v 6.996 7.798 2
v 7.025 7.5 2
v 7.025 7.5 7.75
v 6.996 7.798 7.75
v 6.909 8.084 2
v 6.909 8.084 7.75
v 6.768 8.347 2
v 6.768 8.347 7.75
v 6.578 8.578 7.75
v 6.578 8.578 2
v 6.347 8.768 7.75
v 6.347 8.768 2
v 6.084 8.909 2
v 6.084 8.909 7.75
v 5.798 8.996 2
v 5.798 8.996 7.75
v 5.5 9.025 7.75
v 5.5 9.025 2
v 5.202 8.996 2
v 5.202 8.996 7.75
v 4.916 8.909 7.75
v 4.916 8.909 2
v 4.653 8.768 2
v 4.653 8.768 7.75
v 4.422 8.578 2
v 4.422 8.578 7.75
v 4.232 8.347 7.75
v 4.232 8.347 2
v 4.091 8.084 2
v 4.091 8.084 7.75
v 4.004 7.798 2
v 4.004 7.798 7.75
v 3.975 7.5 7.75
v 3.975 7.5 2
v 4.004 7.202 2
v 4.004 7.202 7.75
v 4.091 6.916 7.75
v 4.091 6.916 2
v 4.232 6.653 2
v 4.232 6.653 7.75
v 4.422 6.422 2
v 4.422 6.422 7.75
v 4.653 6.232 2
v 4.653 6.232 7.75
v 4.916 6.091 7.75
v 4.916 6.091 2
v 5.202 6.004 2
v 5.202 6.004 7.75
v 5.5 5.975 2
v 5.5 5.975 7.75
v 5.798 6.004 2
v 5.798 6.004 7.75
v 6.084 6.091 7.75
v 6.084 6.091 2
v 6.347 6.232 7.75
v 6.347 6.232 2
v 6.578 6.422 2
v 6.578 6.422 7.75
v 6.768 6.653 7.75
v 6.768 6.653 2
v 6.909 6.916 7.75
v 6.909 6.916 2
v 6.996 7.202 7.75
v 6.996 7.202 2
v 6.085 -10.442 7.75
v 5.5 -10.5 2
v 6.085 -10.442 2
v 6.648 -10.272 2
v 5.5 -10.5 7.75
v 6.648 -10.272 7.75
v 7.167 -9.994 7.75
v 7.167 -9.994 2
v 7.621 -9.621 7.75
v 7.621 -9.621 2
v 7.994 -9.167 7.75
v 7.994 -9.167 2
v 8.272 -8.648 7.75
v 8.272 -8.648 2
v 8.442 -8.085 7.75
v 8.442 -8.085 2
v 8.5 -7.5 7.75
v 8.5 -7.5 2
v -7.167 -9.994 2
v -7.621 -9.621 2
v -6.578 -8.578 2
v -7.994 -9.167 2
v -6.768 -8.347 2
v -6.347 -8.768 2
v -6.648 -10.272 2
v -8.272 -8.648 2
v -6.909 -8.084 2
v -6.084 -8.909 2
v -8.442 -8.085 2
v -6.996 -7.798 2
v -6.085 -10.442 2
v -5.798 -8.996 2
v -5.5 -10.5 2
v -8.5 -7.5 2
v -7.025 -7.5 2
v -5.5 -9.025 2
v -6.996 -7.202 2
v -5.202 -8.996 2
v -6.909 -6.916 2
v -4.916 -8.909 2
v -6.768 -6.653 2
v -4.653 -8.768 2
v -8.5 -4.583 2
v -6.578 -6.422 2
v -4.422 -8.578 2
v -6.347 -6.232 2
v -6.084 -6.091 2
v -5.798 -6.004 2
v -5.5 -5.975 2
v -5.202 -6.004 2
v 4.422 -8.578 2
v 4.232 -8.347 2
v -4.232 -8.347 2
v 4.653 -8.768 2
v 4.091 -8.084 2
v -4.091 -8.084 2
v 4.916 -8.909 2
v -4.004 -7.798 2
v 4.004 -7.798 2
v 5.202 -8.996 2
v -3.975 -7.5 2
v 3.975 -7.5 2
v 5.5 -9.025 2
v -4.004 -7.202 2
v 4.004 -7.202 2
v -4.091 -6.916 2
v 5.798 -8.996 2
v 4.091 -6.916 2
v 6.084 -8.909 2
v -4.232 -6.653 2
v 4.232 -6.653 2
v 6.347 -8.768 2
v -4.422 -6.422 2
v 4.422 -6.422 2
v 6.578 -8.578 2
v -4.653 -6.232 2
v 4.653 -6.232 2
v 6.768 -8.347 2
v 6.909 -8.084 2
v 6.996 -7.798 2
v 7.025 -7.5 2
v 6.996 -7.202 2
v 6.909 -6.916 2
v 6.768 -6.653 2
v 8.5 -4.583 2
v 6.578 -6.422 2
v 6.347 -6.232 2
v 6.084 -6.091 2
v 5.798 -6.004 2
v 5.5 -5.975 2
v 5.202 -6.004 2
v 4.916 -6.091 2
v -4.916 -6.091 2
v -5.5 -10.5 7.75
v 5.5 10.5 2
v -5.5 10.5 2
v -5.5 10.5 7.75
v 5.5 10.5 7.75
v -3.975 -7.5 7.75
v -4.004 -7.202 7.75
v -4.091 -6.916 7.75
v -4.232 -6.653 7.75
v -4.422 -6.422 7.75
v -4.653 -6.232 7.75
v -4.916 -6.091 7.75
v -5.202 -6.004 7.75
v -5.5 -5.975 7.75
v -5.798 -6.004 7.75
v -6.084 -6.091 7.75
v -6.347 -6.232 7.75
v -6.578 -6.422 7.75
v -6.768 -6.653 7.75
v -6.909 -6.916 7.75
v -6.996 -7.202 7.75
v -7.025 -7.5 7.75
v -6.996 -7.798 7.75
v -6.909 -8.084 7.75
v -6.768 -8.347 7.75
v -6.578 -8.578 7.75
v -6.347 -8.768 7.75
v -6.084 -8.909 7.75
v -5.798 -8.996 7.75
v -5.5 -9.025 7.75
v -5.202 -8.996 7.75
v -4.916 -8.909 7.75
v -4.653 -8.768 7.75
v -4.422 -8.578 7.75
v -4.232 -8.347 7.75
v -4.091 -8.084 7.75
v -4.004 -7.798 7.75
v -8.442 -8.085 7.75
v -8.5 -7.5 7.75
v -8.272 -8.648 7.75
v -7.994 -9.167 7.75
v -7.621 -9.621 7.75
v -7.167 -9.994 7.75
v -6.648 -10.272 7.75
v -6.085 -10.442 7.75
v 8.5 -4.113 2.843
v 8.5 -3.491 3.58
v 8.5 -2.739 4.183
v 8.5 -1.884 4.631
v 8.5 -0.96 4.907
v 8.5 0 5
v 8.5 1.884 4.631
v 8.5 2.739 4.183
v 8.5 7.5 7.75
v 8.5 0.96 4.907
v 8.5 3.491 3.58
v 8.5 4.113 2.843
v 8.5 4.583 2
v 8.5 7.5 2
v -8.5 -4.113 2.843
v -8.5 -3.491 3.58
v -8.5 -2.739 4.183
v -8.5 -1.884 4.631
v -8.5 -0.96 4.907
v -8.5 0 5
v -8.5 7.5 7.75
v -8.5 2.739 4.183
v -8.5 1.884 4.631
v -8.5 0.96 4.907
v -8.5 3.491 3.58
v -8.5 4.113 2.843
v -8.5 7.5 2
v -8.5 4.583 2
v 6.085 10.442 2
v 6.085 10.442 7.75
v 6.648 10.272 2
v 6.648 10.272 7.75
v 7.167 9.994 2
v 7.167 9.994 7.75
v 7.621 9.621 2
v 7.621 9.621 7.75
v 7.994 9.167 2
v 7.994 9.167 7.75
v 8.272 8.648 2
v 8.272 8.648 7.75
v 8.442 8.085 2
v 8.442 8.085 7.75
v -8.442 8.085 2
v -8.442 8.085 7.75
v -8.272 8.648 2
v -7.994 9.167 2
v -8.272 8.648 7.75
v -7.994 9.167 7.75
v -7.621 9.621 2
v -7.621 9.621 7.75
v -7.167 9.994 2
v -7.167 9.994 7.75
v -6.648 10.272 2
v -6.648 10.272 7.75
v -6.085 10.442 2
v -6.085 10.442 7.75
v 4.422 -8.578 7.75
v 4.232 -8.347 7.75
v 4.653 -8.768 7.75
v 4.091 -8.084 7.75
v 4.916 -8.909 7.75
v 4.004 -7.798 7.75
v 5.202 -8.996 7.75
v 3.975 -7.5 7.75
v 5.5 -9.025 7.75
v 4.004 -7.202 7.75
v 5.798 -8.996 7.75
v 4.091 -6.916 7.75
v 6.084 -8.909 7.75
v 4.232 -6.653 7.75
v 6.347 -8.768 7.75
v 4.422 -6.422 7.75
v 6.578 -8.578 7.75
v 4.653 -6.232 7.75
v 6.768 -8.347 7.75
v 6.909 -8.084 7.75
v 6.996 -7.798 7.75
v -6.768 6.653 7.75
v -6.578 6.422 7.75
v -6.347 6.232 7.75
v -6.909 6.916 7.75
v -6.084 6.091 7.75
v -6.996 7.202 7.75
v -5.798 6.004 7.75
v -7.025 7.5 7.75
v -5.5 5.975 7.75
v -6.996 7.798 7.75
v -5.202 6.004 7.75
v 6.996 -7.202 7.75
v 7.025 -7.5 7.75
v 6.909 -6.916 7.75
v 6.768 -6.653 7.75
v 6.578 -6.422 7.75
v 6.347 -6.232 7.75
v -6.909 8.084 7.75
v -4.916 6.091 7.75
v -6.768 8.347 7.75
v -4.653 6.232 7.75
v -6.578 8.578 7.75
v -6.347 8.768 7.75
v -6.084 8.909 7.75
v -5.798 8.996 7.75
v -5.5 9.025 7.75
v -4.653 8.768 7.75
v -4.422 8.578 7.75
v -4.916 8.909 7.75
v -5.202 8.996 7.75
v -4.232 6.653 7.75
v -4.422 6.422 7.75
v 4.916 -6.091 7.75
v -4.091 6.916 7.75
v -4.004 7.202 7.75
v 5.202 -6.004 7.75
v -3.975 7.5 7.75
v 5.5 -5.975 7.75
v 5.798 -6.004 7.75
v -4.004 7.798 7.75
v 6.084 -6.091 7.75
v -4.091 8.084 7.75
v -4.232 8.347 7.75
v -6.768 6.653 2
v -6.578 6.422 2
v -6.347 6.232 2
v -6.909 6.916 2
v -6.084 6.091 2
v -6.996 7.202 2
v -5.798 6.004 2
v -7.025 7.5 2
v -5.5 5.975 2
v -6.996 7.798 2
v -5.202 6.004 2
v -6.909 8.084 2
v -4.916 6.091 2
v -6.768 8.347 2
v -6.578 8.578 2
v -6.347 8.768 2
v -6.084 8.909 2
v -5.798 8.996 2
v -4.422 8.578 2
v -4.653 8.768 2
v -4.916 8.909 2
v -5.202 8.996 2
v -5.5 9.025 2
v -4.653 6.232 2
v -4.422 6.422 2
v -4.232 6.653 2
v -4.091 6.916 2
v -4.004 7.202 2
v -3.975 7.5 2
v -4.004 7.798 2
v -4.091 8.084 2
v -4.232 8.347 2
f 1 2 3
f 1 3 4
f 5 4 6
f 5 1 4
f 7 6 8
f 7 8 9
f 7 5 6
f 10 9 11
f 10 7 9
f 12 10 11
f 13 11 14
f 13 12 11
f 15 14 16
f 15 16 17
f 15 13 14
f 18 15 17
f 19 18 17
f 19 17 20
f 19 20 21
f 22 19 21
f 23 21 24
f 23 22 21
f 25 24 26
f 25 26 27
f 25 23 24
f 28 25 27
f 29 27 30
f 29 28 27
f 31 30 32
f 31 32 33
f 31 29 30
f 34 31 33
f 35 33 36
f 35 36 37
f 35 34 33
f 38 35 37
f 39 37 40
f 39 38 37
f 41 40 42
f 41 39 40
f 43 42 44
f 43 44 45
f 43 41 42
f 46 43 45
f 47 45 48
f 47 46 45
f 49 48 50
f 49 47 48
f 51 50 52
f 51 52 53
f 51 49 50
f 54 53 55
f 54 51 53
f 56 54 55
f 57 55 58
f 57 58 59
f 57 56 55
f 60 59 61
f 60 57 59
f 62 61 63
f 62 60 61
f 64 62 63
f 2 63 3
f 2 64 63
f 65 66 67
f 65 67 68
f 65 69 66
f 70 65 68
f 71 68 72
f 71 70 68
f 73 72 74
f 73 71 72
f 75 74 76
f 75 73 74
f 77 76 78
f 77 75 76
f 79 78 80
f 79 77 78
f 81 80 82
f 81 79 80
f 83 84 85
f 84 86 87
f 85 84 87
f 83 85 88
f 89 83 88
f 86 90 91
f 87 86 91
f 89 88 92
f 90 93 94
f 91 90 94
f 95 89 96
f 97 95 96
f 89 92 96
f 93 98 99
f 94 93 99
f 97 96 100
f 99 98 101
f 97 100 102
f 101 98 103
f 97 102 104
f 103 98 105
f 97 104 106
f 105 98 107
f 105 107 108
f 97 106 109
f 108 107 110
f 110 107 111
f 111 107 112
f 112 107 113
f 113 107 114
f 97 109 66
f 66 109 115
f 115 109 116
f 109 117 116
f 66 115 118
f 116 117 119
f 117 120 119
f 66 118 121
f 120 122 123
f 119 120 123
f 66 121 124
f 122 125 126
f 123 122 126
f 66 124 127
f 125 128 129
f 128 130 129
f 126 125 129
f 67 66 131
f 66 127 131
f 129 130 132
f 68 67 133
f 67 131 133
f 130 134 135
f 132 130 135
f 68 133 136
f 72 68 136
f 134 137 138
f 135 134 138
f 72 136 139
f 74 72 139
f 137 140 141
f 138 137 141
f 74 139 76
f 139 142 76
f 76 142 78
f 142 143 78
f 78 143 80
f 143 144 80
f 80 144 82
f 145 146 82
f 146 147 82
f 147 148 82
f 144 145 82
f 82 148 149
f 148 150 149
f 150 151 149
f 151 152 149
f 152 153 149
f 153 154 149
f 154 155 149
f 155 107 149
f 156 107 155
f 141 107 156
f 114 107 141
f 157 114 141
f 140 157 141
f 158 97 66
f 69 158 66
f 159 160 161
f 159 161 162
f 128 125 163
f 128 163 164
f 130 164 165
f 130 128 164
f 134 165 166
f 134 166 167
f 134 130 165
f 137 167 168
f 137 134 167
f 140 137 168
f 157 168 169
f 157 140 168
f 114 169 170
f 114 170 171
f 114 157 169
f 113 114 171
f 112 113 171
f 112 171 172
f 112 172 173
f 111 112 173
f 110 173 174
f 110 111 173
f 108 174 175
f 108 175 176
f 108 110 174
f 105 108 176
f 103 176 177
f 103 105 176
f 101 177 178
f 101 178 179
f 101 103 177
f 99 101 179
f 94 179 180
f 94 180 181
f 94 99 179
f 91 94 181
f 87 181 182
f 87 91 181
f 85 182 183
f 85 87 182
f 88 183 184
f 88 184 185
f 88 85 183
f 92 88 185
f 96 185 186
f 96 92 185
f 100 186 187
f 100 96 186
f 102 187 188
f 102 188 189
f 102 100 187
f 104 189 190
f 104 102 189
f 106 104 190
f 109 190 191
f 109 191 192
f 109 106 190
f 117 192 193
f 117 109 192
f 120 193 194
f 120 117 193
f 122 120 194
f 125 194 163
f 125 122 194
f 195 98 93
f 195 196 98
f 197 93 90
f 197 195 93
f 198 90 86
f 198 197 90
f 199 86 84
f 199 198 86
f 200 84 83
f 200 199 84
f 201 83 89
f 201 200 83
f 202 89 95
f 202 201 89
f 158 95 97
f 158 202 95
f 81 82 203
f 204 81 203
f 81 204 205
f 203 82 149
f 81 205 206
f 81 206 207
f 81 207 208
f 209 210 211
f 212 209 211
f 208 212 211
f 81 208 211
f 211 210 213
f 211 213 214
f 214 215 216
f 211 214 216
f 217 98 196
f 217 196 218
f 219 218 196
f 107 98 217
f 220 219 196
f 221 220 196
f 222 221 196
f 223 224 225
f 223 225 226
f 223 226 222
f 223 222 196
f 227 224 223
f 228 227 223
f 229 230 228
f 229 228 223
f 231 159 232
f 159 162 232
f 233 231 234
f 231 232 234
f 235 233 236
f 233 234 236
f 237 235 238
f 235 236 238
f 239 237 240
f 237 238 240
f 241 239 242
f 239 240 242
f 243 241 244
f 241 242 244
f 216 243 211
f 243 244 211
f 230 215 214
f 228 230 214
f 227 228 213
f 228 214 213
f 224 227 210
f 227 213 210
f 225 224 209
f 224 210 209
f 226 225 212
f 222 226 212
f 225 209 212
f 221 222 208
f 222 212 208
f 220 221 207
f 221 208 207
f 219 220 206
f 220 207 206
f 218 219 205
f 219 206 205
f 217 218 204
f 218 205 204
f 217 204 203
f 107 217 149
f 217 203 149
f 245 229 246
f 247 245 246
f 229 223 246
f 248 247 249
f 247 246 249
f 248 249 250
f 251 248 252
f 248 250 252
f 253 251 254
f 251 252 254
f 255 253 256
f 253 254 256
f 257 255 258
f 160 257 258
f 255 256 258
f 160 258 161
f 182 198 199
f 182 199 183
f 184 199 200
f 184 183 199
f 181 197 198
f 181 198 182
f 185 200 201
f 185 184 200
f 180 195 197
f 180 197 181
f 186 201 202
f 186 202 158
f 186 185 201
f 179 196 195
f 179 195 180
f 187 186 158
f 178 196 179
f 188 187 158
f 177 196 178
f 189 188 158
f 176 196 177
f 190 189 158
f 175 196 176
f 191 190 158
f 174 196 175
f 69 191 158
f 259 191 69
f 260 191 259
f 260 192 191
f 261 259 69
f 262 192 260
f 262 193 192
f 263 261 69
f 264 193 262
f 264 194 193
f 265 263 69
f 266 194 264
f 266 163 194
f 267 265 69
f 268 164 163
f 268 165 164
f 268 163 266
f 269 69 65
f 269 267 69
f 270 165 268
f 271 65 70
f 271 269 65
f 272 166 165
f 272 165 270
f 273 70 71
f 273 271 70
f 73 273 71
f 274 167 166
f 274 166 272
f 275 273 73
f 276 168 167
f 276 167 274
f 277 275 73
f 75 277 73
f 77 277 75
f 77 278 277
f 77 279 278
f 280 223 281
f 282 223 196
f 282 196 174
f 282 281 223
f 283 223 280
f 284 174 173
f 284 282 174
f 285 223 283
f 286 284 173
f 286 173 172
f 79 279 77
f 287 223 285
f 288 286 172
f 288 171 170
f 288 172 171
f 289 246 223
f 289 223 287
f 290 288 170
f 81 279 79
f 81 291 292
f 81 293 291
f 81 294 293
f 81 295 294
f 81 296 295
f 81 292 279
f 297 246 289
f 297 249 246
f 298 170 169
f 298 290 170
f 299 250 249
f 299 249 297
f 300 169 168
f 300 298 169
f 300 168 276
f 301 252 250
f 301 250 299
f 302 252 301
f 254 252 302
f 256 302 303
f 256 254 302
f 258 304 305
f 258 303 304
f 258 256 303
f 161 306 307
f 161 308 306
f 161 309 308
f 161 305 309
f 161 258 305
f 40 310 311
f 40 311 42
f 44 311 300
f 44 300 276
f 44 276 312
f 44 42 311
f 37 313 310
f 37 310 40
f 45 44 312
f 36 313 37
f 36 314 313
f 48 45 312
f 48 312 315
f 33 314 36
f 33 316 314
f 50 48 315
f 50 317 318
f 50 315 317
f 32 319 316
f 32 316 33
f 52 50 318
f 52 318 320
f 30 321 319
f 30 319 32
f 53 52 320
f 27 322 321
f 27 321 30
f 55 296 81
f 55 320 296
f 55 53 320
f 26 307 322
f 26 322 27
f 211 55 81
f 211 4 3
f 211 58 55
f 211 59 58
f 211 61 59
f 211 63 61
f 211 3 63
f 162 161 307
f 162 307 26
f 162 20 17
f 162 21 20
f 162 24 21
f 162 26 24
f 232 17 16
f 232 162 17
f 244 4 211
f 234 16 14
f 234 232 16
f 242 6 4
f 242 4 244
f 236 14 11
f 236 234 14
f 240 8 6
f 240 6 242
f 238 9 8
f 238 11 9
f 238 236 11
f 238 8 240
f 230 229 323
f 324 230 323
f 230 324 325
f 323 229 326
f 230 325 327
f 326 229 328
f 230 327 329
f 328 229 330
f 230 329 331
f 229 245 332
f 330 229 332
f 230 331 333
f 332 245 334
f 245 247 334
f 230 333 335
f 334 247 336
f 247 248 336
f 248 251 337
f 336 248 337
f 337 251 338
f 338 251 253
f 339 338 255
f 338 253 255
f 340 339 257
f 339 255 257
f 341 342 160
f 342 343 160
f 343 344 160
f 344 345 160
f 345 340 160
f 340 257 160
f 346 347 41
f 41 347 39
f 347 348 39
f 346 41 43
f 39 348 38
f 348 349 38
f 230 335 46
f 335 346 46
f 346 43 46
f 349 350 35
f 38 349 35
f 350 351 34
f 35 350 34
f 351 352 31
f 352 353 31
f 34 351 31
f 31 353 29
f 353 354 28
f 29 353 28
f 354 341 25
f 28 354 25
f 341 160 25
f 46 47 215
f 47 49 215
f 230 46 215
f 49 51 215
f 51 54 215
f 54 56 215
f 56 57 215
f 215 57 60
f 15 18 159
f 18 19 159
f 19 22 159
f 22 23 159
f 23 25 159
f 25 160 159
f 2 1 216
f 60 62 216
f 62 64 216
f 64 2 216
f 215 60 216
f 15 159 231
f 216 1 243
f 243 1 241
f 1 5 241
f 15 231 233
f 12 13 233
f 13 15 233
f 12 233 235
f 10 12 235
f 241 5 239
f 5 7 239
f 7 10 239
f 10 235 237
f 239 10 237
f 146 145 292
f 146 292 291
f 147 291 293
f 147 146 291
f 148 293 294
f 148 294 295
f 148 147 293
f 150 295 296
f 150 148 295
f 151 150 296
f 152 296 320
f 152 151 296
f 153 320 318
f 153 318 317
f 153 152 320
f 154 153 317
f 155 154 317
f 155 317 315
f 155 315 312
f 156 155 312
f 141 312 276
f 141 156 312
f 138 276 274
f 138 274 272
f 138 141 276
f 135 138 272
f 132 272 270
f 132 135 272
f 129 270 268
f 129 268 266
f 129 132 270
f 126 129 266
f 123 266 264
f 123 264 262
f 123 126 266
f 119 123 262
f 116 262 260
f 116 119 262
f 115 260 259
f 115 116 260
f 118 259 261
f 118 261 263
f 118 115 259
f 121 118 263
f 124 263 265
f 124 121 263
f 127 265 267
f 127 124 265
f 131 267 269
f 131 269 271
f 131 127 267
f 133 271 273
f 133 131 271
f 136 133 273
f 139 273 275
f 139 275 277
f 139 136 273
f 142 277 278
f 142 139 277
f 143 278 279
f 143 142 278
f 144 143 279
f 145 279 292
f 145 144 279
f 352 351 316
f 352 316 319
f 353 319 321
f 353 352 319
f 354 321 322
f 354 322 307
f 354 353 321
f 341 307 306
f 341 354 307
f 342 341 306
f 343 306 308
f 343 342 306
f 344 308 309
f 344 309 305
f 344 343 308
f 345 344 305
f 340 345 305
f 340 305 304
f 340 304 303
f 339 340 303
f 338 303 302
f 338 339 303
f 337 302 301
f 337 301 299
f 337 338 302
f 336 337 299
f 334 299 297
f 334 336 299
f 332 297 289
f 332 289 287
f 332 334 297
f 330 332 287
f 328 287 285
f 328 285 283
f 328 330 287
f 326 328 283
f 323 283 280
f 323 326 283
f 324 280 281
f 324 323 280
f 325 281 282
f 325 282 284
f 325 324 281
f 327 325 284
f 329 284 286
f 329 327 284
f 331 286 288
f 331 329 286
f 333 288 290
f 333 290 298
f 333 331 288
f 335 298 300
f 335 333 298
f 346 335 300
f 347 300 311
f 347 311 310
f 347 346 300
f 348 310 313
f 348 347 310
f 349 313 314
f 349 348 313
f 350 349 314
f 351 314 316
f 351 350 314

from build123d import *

# Parameters (mm, degrees)
EXTRUDE_START       = 2
SKETCH_1_W          = 17
SKETCH_1_H          = 21
SKETCH_1_R          = 1.525
EXTRUDE_1_DEPTH     = 5.75
SKETCH_2_R          = 5
CUT_EXTRUDE_2_DEPTH = 22.43157717
FILLET_1_R          = 3


with BuildPart() as part:
    # 草图1 → 凸台-拉伸1 (new body)
    with BuildSketch(Plane.XY.offset(EXTRUDE_START)):
        Rectangle(SKETCH_1_W, SKETCH_1_H)
        with Locations((-5.5, 7.5)):
            Circle(SKETCH_1_R, mode=Mode.SUBTRACT)
        with Locations((5.5, 7.5)):
            Circle(SKETCH_1_R, mode=Mode.SUBTRACT)
        with Locations((5.5, -7.5)):
            Circle(SKETCH_1_R, mode=Mode.SUBTRACT)
        with Locations((-5.5, -7.5)):
            Circle(SKETCH_1_R, mode=Mode.SUBTRACT)
    extrude(amount=EXTRUDE_1_DEPTH)

    # 草图2 → 切除-拉伸2 (cut, through all)
    with BuildSketch(Plane(origin=(8.5, 0, 0), x_dir=(0, 0, -1), z_dir=(1, 0, 0))):
        Circle(SKETCH_2_R)
    extrude(amount=-CUT_EXTRUDE_2_DEPTH, mode=Mode.SUBTRACT)

    # 圆角1
    fillet_1_edges = [part.edges().sort_by_distance(p)[0] for p in [
        (-8.5, 10.5, 4.875),
        (8.5, 10.5, 4.875),
        (8.5, -10.5, 4.875),
        (-8.5, -10.5, 4.875),
    ]]
    fillet(fillet_1_edges, radius=FILLET_1_R)


solid = part.part
